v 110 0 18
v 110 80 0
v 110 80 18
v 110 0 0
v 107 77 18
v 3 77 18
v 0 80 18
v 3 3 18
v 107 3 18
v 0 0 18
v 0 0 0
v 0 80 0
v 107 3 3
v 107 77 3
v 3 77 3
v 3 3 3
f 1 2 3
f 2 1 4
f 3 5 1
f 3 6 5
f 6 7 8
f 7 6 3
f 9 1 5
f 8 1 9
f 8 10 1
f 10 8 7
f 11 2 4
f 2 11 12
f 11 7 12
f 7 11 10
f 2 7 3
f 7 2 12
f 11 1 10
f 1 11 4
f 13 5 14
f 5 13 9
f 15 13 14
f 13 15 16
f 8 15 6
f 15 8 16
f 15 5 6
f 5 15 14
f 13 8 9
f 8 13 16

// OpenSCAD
$fn = 48;
module base() {
  difference() {
    cube([110, 80, 18], center=false);
    translate([3, 3, 3]) cube([104, 74, 16], center=false);
    translate([15, 8, 15]) cube([78, 52, 5], center=false);
  }
}
module button_holes() {
  translate([90, 58, 16]) cylinder(h=5, r=3);
  translate([100, 58, 16]) cylinder(h=5, r=3);
  translate([18, 58, 16]) cylinder(h=5, r=3);
  translate([28, 58, 16]) cylinder(h=5, r=3);
}
difference() { base(); button_holes(); }
